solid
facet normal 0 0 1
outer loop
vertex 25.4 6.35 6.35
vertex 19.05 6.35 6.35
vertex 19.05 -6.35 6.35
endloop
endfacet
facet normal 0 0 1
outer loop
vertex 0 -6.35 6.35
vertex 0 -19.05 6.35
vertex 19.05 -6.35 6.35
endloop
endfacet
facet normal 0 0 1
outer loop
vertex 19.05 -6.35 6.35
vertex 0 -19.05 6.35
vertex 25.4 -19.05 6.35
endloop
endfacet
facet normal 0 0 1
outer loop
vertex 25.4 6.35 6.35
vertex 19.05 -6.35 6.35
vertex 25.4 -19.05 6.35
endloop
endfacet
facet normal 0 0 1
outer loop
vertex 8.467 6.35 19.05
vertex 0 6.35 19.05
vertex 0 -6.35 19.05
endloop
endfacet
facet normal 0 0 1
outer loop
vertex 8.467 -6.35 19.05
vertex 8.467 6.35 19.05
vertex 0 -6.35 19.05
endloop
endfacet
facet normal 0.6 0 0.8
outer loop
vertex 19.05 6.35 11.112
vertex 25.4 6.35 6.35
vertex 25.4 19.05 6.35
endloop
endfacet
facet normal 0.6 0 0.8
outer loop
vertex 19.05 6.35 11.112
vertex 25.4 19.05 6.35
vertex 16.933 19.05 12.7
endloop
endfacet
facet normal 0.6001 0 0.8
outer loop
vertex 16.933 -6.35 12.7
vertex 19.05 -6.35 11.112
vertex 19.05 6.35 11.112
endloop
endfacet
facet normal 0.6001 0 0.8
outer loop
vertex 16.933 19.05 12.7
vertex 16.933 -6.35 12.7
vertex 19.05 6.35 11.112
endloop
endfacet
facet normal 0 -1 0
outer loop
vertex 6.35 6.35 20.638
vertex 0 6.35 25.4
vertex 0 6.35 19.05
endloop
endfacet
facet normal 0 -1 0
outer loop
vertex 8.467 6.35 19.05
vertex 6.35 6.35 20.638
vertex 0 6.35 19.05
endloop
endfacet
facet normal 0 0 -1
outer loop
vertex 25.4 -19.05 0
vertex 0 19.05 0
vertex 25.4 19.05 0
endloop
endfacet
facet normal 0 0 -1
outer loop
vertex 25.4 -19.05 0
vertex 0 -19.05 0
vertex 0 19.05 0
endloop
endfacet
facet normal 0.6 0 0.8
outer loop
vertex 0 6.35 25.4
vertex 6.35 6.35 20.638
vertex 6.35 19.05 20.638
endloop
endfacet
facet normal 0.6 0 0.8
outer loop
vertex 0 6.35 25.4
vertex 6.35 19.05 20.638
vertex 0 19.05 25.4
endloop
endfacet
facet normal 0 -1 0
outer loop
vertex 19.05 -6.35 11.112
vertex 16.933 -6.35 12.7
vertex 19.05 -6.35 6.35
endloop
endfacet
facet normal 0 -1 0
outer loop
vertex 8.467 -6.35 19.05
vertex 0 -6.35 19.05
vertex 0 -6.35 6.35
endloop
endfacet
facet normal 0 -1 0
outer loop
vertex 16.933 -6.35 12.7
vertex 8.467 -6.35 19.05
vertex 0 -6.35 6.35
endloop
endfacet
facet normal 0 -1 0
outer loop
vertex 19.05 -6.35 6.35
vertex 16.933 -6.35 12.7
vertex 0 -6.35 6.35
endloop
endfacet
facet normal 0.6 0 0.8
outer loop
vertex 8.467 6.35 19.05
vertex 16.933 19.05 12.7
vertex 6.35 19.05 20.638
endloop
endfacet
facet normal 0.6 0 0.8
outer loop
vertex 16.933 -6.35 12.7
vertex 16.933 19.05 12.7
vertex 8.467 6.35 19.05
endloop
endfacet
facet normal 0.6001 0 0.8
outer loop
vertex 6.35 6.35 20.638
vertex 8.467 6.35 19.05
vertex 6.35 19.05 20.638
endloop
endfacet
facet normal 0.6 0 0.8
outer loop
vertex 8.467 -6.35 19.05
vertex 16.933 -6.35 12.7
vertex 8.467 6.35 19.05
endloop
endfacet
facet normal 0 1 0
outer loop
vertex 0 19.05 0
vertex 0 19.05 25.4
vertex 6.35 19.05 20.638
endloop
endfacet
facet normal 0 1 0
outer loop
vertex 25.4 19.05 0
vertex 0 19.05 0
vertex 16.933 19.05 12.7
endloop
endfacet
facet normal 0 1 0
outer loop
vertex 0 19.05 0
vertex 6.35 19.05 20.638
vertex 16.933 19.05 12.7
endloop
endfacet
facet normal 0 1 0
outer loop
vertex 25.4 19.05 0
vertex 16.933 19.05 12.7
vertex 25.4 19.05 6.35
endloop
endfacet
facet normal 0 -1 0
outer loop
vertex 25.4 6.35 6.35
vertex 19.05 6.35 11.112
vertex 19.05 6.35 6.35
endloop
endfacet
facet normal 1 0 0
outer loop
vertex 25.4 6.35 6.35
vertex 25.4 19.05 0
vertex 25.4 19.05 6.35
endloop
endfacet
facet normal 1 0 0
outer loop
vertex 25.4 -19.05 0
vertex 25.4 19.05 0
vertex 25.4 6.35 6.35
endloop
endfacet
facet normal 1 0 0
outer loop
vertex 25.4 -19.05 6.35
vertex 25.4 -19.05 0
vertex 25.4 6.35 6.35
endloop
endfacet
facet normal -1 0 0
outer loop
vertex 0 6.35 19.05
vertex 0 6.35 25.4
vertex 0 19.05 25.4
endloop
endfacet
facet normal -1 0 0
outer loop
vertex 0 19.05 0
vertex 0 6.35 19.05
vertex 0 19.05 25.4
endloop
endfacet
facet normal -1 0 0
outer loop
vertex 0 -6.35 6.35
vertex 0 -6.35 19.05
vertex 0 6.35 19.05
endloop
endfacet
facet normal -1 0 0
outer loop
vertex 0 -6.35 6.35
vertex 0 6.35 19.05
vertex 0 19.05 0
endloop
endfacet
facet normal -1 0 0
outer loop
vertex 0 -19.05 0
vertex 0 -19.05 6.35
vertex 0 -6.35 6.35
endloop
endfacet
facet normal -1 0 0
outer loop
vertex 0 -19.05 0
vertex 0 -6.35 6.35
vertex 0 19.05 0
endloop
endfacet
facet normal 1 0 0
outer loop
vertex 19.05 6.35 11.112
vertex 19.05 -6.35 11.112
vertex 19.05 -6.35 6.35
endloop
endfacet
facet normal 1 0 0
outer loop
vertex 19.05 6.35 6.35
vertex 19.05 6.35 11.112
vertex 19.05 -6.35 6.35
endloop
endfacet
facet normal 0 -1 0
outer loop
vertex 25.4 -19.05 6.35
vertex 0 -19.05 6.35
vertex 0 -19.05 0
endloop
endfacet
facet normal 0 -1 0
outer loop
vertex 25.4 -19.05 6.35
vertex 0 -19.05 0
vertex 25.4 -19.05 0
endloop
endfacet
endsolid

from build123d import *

# Parameters (mm, degrees)
F1_DEPTH = 19.05
F3_DEPTH = 25.401
F5_DEPTH = 12.7


with BuildPart() as f1:
    # F0 (on Front) → F1 (new body, symmetric)
    with BuildSketch(Plane.XZ):
        Polygon((0, 6.35), (0, 0), (25.4, 0), (25.4, 6.35), (16.9333333333, 6.35), align=None)
        Polygon((0, 20.6375), (0, 6.35), (16.9333333333, 6.35), (16.9333333333, 12.7), (6.35, 20.6375), align=None)
        Polygon((16.9333333333, 6.35), (25.4, 6.35), (16.9333333333, 12.7), align=None)
        Polygon((0, 25.4), (0, 20.6375), (6.35, 20.6375), align=None)
    extrude(amount=F1_DEPTH, both=True)

    # F2 (on face) → F3 (cut, through all)
    with BuildSketch(Plane(origin=(0, 0, 0), x_dir=(0, -1, 0), z_dir=(-1, 0, 0))):
        Polygon((6.35, 6.35), (19.05, 6.35), (19.05, 25.4), (-6.35, 25.4), (-6.35, 19.05), (6.35, 19.05), align=None)
    extrude(amount=-F3_DEPTH, mode=Mode.SUBTRACT)

    # F4 (on face) → F5 (cut)
    with BuildSketch(Plane.XZ.offset(6.35)):
        Polygon((19.05, 6.35), (25.4, 6.35), (19.05, 11.1125), align=None)
    extrude(amount=-F5_DEPTH, mode=Mode.SUBTRACT)


solid = f1.part
